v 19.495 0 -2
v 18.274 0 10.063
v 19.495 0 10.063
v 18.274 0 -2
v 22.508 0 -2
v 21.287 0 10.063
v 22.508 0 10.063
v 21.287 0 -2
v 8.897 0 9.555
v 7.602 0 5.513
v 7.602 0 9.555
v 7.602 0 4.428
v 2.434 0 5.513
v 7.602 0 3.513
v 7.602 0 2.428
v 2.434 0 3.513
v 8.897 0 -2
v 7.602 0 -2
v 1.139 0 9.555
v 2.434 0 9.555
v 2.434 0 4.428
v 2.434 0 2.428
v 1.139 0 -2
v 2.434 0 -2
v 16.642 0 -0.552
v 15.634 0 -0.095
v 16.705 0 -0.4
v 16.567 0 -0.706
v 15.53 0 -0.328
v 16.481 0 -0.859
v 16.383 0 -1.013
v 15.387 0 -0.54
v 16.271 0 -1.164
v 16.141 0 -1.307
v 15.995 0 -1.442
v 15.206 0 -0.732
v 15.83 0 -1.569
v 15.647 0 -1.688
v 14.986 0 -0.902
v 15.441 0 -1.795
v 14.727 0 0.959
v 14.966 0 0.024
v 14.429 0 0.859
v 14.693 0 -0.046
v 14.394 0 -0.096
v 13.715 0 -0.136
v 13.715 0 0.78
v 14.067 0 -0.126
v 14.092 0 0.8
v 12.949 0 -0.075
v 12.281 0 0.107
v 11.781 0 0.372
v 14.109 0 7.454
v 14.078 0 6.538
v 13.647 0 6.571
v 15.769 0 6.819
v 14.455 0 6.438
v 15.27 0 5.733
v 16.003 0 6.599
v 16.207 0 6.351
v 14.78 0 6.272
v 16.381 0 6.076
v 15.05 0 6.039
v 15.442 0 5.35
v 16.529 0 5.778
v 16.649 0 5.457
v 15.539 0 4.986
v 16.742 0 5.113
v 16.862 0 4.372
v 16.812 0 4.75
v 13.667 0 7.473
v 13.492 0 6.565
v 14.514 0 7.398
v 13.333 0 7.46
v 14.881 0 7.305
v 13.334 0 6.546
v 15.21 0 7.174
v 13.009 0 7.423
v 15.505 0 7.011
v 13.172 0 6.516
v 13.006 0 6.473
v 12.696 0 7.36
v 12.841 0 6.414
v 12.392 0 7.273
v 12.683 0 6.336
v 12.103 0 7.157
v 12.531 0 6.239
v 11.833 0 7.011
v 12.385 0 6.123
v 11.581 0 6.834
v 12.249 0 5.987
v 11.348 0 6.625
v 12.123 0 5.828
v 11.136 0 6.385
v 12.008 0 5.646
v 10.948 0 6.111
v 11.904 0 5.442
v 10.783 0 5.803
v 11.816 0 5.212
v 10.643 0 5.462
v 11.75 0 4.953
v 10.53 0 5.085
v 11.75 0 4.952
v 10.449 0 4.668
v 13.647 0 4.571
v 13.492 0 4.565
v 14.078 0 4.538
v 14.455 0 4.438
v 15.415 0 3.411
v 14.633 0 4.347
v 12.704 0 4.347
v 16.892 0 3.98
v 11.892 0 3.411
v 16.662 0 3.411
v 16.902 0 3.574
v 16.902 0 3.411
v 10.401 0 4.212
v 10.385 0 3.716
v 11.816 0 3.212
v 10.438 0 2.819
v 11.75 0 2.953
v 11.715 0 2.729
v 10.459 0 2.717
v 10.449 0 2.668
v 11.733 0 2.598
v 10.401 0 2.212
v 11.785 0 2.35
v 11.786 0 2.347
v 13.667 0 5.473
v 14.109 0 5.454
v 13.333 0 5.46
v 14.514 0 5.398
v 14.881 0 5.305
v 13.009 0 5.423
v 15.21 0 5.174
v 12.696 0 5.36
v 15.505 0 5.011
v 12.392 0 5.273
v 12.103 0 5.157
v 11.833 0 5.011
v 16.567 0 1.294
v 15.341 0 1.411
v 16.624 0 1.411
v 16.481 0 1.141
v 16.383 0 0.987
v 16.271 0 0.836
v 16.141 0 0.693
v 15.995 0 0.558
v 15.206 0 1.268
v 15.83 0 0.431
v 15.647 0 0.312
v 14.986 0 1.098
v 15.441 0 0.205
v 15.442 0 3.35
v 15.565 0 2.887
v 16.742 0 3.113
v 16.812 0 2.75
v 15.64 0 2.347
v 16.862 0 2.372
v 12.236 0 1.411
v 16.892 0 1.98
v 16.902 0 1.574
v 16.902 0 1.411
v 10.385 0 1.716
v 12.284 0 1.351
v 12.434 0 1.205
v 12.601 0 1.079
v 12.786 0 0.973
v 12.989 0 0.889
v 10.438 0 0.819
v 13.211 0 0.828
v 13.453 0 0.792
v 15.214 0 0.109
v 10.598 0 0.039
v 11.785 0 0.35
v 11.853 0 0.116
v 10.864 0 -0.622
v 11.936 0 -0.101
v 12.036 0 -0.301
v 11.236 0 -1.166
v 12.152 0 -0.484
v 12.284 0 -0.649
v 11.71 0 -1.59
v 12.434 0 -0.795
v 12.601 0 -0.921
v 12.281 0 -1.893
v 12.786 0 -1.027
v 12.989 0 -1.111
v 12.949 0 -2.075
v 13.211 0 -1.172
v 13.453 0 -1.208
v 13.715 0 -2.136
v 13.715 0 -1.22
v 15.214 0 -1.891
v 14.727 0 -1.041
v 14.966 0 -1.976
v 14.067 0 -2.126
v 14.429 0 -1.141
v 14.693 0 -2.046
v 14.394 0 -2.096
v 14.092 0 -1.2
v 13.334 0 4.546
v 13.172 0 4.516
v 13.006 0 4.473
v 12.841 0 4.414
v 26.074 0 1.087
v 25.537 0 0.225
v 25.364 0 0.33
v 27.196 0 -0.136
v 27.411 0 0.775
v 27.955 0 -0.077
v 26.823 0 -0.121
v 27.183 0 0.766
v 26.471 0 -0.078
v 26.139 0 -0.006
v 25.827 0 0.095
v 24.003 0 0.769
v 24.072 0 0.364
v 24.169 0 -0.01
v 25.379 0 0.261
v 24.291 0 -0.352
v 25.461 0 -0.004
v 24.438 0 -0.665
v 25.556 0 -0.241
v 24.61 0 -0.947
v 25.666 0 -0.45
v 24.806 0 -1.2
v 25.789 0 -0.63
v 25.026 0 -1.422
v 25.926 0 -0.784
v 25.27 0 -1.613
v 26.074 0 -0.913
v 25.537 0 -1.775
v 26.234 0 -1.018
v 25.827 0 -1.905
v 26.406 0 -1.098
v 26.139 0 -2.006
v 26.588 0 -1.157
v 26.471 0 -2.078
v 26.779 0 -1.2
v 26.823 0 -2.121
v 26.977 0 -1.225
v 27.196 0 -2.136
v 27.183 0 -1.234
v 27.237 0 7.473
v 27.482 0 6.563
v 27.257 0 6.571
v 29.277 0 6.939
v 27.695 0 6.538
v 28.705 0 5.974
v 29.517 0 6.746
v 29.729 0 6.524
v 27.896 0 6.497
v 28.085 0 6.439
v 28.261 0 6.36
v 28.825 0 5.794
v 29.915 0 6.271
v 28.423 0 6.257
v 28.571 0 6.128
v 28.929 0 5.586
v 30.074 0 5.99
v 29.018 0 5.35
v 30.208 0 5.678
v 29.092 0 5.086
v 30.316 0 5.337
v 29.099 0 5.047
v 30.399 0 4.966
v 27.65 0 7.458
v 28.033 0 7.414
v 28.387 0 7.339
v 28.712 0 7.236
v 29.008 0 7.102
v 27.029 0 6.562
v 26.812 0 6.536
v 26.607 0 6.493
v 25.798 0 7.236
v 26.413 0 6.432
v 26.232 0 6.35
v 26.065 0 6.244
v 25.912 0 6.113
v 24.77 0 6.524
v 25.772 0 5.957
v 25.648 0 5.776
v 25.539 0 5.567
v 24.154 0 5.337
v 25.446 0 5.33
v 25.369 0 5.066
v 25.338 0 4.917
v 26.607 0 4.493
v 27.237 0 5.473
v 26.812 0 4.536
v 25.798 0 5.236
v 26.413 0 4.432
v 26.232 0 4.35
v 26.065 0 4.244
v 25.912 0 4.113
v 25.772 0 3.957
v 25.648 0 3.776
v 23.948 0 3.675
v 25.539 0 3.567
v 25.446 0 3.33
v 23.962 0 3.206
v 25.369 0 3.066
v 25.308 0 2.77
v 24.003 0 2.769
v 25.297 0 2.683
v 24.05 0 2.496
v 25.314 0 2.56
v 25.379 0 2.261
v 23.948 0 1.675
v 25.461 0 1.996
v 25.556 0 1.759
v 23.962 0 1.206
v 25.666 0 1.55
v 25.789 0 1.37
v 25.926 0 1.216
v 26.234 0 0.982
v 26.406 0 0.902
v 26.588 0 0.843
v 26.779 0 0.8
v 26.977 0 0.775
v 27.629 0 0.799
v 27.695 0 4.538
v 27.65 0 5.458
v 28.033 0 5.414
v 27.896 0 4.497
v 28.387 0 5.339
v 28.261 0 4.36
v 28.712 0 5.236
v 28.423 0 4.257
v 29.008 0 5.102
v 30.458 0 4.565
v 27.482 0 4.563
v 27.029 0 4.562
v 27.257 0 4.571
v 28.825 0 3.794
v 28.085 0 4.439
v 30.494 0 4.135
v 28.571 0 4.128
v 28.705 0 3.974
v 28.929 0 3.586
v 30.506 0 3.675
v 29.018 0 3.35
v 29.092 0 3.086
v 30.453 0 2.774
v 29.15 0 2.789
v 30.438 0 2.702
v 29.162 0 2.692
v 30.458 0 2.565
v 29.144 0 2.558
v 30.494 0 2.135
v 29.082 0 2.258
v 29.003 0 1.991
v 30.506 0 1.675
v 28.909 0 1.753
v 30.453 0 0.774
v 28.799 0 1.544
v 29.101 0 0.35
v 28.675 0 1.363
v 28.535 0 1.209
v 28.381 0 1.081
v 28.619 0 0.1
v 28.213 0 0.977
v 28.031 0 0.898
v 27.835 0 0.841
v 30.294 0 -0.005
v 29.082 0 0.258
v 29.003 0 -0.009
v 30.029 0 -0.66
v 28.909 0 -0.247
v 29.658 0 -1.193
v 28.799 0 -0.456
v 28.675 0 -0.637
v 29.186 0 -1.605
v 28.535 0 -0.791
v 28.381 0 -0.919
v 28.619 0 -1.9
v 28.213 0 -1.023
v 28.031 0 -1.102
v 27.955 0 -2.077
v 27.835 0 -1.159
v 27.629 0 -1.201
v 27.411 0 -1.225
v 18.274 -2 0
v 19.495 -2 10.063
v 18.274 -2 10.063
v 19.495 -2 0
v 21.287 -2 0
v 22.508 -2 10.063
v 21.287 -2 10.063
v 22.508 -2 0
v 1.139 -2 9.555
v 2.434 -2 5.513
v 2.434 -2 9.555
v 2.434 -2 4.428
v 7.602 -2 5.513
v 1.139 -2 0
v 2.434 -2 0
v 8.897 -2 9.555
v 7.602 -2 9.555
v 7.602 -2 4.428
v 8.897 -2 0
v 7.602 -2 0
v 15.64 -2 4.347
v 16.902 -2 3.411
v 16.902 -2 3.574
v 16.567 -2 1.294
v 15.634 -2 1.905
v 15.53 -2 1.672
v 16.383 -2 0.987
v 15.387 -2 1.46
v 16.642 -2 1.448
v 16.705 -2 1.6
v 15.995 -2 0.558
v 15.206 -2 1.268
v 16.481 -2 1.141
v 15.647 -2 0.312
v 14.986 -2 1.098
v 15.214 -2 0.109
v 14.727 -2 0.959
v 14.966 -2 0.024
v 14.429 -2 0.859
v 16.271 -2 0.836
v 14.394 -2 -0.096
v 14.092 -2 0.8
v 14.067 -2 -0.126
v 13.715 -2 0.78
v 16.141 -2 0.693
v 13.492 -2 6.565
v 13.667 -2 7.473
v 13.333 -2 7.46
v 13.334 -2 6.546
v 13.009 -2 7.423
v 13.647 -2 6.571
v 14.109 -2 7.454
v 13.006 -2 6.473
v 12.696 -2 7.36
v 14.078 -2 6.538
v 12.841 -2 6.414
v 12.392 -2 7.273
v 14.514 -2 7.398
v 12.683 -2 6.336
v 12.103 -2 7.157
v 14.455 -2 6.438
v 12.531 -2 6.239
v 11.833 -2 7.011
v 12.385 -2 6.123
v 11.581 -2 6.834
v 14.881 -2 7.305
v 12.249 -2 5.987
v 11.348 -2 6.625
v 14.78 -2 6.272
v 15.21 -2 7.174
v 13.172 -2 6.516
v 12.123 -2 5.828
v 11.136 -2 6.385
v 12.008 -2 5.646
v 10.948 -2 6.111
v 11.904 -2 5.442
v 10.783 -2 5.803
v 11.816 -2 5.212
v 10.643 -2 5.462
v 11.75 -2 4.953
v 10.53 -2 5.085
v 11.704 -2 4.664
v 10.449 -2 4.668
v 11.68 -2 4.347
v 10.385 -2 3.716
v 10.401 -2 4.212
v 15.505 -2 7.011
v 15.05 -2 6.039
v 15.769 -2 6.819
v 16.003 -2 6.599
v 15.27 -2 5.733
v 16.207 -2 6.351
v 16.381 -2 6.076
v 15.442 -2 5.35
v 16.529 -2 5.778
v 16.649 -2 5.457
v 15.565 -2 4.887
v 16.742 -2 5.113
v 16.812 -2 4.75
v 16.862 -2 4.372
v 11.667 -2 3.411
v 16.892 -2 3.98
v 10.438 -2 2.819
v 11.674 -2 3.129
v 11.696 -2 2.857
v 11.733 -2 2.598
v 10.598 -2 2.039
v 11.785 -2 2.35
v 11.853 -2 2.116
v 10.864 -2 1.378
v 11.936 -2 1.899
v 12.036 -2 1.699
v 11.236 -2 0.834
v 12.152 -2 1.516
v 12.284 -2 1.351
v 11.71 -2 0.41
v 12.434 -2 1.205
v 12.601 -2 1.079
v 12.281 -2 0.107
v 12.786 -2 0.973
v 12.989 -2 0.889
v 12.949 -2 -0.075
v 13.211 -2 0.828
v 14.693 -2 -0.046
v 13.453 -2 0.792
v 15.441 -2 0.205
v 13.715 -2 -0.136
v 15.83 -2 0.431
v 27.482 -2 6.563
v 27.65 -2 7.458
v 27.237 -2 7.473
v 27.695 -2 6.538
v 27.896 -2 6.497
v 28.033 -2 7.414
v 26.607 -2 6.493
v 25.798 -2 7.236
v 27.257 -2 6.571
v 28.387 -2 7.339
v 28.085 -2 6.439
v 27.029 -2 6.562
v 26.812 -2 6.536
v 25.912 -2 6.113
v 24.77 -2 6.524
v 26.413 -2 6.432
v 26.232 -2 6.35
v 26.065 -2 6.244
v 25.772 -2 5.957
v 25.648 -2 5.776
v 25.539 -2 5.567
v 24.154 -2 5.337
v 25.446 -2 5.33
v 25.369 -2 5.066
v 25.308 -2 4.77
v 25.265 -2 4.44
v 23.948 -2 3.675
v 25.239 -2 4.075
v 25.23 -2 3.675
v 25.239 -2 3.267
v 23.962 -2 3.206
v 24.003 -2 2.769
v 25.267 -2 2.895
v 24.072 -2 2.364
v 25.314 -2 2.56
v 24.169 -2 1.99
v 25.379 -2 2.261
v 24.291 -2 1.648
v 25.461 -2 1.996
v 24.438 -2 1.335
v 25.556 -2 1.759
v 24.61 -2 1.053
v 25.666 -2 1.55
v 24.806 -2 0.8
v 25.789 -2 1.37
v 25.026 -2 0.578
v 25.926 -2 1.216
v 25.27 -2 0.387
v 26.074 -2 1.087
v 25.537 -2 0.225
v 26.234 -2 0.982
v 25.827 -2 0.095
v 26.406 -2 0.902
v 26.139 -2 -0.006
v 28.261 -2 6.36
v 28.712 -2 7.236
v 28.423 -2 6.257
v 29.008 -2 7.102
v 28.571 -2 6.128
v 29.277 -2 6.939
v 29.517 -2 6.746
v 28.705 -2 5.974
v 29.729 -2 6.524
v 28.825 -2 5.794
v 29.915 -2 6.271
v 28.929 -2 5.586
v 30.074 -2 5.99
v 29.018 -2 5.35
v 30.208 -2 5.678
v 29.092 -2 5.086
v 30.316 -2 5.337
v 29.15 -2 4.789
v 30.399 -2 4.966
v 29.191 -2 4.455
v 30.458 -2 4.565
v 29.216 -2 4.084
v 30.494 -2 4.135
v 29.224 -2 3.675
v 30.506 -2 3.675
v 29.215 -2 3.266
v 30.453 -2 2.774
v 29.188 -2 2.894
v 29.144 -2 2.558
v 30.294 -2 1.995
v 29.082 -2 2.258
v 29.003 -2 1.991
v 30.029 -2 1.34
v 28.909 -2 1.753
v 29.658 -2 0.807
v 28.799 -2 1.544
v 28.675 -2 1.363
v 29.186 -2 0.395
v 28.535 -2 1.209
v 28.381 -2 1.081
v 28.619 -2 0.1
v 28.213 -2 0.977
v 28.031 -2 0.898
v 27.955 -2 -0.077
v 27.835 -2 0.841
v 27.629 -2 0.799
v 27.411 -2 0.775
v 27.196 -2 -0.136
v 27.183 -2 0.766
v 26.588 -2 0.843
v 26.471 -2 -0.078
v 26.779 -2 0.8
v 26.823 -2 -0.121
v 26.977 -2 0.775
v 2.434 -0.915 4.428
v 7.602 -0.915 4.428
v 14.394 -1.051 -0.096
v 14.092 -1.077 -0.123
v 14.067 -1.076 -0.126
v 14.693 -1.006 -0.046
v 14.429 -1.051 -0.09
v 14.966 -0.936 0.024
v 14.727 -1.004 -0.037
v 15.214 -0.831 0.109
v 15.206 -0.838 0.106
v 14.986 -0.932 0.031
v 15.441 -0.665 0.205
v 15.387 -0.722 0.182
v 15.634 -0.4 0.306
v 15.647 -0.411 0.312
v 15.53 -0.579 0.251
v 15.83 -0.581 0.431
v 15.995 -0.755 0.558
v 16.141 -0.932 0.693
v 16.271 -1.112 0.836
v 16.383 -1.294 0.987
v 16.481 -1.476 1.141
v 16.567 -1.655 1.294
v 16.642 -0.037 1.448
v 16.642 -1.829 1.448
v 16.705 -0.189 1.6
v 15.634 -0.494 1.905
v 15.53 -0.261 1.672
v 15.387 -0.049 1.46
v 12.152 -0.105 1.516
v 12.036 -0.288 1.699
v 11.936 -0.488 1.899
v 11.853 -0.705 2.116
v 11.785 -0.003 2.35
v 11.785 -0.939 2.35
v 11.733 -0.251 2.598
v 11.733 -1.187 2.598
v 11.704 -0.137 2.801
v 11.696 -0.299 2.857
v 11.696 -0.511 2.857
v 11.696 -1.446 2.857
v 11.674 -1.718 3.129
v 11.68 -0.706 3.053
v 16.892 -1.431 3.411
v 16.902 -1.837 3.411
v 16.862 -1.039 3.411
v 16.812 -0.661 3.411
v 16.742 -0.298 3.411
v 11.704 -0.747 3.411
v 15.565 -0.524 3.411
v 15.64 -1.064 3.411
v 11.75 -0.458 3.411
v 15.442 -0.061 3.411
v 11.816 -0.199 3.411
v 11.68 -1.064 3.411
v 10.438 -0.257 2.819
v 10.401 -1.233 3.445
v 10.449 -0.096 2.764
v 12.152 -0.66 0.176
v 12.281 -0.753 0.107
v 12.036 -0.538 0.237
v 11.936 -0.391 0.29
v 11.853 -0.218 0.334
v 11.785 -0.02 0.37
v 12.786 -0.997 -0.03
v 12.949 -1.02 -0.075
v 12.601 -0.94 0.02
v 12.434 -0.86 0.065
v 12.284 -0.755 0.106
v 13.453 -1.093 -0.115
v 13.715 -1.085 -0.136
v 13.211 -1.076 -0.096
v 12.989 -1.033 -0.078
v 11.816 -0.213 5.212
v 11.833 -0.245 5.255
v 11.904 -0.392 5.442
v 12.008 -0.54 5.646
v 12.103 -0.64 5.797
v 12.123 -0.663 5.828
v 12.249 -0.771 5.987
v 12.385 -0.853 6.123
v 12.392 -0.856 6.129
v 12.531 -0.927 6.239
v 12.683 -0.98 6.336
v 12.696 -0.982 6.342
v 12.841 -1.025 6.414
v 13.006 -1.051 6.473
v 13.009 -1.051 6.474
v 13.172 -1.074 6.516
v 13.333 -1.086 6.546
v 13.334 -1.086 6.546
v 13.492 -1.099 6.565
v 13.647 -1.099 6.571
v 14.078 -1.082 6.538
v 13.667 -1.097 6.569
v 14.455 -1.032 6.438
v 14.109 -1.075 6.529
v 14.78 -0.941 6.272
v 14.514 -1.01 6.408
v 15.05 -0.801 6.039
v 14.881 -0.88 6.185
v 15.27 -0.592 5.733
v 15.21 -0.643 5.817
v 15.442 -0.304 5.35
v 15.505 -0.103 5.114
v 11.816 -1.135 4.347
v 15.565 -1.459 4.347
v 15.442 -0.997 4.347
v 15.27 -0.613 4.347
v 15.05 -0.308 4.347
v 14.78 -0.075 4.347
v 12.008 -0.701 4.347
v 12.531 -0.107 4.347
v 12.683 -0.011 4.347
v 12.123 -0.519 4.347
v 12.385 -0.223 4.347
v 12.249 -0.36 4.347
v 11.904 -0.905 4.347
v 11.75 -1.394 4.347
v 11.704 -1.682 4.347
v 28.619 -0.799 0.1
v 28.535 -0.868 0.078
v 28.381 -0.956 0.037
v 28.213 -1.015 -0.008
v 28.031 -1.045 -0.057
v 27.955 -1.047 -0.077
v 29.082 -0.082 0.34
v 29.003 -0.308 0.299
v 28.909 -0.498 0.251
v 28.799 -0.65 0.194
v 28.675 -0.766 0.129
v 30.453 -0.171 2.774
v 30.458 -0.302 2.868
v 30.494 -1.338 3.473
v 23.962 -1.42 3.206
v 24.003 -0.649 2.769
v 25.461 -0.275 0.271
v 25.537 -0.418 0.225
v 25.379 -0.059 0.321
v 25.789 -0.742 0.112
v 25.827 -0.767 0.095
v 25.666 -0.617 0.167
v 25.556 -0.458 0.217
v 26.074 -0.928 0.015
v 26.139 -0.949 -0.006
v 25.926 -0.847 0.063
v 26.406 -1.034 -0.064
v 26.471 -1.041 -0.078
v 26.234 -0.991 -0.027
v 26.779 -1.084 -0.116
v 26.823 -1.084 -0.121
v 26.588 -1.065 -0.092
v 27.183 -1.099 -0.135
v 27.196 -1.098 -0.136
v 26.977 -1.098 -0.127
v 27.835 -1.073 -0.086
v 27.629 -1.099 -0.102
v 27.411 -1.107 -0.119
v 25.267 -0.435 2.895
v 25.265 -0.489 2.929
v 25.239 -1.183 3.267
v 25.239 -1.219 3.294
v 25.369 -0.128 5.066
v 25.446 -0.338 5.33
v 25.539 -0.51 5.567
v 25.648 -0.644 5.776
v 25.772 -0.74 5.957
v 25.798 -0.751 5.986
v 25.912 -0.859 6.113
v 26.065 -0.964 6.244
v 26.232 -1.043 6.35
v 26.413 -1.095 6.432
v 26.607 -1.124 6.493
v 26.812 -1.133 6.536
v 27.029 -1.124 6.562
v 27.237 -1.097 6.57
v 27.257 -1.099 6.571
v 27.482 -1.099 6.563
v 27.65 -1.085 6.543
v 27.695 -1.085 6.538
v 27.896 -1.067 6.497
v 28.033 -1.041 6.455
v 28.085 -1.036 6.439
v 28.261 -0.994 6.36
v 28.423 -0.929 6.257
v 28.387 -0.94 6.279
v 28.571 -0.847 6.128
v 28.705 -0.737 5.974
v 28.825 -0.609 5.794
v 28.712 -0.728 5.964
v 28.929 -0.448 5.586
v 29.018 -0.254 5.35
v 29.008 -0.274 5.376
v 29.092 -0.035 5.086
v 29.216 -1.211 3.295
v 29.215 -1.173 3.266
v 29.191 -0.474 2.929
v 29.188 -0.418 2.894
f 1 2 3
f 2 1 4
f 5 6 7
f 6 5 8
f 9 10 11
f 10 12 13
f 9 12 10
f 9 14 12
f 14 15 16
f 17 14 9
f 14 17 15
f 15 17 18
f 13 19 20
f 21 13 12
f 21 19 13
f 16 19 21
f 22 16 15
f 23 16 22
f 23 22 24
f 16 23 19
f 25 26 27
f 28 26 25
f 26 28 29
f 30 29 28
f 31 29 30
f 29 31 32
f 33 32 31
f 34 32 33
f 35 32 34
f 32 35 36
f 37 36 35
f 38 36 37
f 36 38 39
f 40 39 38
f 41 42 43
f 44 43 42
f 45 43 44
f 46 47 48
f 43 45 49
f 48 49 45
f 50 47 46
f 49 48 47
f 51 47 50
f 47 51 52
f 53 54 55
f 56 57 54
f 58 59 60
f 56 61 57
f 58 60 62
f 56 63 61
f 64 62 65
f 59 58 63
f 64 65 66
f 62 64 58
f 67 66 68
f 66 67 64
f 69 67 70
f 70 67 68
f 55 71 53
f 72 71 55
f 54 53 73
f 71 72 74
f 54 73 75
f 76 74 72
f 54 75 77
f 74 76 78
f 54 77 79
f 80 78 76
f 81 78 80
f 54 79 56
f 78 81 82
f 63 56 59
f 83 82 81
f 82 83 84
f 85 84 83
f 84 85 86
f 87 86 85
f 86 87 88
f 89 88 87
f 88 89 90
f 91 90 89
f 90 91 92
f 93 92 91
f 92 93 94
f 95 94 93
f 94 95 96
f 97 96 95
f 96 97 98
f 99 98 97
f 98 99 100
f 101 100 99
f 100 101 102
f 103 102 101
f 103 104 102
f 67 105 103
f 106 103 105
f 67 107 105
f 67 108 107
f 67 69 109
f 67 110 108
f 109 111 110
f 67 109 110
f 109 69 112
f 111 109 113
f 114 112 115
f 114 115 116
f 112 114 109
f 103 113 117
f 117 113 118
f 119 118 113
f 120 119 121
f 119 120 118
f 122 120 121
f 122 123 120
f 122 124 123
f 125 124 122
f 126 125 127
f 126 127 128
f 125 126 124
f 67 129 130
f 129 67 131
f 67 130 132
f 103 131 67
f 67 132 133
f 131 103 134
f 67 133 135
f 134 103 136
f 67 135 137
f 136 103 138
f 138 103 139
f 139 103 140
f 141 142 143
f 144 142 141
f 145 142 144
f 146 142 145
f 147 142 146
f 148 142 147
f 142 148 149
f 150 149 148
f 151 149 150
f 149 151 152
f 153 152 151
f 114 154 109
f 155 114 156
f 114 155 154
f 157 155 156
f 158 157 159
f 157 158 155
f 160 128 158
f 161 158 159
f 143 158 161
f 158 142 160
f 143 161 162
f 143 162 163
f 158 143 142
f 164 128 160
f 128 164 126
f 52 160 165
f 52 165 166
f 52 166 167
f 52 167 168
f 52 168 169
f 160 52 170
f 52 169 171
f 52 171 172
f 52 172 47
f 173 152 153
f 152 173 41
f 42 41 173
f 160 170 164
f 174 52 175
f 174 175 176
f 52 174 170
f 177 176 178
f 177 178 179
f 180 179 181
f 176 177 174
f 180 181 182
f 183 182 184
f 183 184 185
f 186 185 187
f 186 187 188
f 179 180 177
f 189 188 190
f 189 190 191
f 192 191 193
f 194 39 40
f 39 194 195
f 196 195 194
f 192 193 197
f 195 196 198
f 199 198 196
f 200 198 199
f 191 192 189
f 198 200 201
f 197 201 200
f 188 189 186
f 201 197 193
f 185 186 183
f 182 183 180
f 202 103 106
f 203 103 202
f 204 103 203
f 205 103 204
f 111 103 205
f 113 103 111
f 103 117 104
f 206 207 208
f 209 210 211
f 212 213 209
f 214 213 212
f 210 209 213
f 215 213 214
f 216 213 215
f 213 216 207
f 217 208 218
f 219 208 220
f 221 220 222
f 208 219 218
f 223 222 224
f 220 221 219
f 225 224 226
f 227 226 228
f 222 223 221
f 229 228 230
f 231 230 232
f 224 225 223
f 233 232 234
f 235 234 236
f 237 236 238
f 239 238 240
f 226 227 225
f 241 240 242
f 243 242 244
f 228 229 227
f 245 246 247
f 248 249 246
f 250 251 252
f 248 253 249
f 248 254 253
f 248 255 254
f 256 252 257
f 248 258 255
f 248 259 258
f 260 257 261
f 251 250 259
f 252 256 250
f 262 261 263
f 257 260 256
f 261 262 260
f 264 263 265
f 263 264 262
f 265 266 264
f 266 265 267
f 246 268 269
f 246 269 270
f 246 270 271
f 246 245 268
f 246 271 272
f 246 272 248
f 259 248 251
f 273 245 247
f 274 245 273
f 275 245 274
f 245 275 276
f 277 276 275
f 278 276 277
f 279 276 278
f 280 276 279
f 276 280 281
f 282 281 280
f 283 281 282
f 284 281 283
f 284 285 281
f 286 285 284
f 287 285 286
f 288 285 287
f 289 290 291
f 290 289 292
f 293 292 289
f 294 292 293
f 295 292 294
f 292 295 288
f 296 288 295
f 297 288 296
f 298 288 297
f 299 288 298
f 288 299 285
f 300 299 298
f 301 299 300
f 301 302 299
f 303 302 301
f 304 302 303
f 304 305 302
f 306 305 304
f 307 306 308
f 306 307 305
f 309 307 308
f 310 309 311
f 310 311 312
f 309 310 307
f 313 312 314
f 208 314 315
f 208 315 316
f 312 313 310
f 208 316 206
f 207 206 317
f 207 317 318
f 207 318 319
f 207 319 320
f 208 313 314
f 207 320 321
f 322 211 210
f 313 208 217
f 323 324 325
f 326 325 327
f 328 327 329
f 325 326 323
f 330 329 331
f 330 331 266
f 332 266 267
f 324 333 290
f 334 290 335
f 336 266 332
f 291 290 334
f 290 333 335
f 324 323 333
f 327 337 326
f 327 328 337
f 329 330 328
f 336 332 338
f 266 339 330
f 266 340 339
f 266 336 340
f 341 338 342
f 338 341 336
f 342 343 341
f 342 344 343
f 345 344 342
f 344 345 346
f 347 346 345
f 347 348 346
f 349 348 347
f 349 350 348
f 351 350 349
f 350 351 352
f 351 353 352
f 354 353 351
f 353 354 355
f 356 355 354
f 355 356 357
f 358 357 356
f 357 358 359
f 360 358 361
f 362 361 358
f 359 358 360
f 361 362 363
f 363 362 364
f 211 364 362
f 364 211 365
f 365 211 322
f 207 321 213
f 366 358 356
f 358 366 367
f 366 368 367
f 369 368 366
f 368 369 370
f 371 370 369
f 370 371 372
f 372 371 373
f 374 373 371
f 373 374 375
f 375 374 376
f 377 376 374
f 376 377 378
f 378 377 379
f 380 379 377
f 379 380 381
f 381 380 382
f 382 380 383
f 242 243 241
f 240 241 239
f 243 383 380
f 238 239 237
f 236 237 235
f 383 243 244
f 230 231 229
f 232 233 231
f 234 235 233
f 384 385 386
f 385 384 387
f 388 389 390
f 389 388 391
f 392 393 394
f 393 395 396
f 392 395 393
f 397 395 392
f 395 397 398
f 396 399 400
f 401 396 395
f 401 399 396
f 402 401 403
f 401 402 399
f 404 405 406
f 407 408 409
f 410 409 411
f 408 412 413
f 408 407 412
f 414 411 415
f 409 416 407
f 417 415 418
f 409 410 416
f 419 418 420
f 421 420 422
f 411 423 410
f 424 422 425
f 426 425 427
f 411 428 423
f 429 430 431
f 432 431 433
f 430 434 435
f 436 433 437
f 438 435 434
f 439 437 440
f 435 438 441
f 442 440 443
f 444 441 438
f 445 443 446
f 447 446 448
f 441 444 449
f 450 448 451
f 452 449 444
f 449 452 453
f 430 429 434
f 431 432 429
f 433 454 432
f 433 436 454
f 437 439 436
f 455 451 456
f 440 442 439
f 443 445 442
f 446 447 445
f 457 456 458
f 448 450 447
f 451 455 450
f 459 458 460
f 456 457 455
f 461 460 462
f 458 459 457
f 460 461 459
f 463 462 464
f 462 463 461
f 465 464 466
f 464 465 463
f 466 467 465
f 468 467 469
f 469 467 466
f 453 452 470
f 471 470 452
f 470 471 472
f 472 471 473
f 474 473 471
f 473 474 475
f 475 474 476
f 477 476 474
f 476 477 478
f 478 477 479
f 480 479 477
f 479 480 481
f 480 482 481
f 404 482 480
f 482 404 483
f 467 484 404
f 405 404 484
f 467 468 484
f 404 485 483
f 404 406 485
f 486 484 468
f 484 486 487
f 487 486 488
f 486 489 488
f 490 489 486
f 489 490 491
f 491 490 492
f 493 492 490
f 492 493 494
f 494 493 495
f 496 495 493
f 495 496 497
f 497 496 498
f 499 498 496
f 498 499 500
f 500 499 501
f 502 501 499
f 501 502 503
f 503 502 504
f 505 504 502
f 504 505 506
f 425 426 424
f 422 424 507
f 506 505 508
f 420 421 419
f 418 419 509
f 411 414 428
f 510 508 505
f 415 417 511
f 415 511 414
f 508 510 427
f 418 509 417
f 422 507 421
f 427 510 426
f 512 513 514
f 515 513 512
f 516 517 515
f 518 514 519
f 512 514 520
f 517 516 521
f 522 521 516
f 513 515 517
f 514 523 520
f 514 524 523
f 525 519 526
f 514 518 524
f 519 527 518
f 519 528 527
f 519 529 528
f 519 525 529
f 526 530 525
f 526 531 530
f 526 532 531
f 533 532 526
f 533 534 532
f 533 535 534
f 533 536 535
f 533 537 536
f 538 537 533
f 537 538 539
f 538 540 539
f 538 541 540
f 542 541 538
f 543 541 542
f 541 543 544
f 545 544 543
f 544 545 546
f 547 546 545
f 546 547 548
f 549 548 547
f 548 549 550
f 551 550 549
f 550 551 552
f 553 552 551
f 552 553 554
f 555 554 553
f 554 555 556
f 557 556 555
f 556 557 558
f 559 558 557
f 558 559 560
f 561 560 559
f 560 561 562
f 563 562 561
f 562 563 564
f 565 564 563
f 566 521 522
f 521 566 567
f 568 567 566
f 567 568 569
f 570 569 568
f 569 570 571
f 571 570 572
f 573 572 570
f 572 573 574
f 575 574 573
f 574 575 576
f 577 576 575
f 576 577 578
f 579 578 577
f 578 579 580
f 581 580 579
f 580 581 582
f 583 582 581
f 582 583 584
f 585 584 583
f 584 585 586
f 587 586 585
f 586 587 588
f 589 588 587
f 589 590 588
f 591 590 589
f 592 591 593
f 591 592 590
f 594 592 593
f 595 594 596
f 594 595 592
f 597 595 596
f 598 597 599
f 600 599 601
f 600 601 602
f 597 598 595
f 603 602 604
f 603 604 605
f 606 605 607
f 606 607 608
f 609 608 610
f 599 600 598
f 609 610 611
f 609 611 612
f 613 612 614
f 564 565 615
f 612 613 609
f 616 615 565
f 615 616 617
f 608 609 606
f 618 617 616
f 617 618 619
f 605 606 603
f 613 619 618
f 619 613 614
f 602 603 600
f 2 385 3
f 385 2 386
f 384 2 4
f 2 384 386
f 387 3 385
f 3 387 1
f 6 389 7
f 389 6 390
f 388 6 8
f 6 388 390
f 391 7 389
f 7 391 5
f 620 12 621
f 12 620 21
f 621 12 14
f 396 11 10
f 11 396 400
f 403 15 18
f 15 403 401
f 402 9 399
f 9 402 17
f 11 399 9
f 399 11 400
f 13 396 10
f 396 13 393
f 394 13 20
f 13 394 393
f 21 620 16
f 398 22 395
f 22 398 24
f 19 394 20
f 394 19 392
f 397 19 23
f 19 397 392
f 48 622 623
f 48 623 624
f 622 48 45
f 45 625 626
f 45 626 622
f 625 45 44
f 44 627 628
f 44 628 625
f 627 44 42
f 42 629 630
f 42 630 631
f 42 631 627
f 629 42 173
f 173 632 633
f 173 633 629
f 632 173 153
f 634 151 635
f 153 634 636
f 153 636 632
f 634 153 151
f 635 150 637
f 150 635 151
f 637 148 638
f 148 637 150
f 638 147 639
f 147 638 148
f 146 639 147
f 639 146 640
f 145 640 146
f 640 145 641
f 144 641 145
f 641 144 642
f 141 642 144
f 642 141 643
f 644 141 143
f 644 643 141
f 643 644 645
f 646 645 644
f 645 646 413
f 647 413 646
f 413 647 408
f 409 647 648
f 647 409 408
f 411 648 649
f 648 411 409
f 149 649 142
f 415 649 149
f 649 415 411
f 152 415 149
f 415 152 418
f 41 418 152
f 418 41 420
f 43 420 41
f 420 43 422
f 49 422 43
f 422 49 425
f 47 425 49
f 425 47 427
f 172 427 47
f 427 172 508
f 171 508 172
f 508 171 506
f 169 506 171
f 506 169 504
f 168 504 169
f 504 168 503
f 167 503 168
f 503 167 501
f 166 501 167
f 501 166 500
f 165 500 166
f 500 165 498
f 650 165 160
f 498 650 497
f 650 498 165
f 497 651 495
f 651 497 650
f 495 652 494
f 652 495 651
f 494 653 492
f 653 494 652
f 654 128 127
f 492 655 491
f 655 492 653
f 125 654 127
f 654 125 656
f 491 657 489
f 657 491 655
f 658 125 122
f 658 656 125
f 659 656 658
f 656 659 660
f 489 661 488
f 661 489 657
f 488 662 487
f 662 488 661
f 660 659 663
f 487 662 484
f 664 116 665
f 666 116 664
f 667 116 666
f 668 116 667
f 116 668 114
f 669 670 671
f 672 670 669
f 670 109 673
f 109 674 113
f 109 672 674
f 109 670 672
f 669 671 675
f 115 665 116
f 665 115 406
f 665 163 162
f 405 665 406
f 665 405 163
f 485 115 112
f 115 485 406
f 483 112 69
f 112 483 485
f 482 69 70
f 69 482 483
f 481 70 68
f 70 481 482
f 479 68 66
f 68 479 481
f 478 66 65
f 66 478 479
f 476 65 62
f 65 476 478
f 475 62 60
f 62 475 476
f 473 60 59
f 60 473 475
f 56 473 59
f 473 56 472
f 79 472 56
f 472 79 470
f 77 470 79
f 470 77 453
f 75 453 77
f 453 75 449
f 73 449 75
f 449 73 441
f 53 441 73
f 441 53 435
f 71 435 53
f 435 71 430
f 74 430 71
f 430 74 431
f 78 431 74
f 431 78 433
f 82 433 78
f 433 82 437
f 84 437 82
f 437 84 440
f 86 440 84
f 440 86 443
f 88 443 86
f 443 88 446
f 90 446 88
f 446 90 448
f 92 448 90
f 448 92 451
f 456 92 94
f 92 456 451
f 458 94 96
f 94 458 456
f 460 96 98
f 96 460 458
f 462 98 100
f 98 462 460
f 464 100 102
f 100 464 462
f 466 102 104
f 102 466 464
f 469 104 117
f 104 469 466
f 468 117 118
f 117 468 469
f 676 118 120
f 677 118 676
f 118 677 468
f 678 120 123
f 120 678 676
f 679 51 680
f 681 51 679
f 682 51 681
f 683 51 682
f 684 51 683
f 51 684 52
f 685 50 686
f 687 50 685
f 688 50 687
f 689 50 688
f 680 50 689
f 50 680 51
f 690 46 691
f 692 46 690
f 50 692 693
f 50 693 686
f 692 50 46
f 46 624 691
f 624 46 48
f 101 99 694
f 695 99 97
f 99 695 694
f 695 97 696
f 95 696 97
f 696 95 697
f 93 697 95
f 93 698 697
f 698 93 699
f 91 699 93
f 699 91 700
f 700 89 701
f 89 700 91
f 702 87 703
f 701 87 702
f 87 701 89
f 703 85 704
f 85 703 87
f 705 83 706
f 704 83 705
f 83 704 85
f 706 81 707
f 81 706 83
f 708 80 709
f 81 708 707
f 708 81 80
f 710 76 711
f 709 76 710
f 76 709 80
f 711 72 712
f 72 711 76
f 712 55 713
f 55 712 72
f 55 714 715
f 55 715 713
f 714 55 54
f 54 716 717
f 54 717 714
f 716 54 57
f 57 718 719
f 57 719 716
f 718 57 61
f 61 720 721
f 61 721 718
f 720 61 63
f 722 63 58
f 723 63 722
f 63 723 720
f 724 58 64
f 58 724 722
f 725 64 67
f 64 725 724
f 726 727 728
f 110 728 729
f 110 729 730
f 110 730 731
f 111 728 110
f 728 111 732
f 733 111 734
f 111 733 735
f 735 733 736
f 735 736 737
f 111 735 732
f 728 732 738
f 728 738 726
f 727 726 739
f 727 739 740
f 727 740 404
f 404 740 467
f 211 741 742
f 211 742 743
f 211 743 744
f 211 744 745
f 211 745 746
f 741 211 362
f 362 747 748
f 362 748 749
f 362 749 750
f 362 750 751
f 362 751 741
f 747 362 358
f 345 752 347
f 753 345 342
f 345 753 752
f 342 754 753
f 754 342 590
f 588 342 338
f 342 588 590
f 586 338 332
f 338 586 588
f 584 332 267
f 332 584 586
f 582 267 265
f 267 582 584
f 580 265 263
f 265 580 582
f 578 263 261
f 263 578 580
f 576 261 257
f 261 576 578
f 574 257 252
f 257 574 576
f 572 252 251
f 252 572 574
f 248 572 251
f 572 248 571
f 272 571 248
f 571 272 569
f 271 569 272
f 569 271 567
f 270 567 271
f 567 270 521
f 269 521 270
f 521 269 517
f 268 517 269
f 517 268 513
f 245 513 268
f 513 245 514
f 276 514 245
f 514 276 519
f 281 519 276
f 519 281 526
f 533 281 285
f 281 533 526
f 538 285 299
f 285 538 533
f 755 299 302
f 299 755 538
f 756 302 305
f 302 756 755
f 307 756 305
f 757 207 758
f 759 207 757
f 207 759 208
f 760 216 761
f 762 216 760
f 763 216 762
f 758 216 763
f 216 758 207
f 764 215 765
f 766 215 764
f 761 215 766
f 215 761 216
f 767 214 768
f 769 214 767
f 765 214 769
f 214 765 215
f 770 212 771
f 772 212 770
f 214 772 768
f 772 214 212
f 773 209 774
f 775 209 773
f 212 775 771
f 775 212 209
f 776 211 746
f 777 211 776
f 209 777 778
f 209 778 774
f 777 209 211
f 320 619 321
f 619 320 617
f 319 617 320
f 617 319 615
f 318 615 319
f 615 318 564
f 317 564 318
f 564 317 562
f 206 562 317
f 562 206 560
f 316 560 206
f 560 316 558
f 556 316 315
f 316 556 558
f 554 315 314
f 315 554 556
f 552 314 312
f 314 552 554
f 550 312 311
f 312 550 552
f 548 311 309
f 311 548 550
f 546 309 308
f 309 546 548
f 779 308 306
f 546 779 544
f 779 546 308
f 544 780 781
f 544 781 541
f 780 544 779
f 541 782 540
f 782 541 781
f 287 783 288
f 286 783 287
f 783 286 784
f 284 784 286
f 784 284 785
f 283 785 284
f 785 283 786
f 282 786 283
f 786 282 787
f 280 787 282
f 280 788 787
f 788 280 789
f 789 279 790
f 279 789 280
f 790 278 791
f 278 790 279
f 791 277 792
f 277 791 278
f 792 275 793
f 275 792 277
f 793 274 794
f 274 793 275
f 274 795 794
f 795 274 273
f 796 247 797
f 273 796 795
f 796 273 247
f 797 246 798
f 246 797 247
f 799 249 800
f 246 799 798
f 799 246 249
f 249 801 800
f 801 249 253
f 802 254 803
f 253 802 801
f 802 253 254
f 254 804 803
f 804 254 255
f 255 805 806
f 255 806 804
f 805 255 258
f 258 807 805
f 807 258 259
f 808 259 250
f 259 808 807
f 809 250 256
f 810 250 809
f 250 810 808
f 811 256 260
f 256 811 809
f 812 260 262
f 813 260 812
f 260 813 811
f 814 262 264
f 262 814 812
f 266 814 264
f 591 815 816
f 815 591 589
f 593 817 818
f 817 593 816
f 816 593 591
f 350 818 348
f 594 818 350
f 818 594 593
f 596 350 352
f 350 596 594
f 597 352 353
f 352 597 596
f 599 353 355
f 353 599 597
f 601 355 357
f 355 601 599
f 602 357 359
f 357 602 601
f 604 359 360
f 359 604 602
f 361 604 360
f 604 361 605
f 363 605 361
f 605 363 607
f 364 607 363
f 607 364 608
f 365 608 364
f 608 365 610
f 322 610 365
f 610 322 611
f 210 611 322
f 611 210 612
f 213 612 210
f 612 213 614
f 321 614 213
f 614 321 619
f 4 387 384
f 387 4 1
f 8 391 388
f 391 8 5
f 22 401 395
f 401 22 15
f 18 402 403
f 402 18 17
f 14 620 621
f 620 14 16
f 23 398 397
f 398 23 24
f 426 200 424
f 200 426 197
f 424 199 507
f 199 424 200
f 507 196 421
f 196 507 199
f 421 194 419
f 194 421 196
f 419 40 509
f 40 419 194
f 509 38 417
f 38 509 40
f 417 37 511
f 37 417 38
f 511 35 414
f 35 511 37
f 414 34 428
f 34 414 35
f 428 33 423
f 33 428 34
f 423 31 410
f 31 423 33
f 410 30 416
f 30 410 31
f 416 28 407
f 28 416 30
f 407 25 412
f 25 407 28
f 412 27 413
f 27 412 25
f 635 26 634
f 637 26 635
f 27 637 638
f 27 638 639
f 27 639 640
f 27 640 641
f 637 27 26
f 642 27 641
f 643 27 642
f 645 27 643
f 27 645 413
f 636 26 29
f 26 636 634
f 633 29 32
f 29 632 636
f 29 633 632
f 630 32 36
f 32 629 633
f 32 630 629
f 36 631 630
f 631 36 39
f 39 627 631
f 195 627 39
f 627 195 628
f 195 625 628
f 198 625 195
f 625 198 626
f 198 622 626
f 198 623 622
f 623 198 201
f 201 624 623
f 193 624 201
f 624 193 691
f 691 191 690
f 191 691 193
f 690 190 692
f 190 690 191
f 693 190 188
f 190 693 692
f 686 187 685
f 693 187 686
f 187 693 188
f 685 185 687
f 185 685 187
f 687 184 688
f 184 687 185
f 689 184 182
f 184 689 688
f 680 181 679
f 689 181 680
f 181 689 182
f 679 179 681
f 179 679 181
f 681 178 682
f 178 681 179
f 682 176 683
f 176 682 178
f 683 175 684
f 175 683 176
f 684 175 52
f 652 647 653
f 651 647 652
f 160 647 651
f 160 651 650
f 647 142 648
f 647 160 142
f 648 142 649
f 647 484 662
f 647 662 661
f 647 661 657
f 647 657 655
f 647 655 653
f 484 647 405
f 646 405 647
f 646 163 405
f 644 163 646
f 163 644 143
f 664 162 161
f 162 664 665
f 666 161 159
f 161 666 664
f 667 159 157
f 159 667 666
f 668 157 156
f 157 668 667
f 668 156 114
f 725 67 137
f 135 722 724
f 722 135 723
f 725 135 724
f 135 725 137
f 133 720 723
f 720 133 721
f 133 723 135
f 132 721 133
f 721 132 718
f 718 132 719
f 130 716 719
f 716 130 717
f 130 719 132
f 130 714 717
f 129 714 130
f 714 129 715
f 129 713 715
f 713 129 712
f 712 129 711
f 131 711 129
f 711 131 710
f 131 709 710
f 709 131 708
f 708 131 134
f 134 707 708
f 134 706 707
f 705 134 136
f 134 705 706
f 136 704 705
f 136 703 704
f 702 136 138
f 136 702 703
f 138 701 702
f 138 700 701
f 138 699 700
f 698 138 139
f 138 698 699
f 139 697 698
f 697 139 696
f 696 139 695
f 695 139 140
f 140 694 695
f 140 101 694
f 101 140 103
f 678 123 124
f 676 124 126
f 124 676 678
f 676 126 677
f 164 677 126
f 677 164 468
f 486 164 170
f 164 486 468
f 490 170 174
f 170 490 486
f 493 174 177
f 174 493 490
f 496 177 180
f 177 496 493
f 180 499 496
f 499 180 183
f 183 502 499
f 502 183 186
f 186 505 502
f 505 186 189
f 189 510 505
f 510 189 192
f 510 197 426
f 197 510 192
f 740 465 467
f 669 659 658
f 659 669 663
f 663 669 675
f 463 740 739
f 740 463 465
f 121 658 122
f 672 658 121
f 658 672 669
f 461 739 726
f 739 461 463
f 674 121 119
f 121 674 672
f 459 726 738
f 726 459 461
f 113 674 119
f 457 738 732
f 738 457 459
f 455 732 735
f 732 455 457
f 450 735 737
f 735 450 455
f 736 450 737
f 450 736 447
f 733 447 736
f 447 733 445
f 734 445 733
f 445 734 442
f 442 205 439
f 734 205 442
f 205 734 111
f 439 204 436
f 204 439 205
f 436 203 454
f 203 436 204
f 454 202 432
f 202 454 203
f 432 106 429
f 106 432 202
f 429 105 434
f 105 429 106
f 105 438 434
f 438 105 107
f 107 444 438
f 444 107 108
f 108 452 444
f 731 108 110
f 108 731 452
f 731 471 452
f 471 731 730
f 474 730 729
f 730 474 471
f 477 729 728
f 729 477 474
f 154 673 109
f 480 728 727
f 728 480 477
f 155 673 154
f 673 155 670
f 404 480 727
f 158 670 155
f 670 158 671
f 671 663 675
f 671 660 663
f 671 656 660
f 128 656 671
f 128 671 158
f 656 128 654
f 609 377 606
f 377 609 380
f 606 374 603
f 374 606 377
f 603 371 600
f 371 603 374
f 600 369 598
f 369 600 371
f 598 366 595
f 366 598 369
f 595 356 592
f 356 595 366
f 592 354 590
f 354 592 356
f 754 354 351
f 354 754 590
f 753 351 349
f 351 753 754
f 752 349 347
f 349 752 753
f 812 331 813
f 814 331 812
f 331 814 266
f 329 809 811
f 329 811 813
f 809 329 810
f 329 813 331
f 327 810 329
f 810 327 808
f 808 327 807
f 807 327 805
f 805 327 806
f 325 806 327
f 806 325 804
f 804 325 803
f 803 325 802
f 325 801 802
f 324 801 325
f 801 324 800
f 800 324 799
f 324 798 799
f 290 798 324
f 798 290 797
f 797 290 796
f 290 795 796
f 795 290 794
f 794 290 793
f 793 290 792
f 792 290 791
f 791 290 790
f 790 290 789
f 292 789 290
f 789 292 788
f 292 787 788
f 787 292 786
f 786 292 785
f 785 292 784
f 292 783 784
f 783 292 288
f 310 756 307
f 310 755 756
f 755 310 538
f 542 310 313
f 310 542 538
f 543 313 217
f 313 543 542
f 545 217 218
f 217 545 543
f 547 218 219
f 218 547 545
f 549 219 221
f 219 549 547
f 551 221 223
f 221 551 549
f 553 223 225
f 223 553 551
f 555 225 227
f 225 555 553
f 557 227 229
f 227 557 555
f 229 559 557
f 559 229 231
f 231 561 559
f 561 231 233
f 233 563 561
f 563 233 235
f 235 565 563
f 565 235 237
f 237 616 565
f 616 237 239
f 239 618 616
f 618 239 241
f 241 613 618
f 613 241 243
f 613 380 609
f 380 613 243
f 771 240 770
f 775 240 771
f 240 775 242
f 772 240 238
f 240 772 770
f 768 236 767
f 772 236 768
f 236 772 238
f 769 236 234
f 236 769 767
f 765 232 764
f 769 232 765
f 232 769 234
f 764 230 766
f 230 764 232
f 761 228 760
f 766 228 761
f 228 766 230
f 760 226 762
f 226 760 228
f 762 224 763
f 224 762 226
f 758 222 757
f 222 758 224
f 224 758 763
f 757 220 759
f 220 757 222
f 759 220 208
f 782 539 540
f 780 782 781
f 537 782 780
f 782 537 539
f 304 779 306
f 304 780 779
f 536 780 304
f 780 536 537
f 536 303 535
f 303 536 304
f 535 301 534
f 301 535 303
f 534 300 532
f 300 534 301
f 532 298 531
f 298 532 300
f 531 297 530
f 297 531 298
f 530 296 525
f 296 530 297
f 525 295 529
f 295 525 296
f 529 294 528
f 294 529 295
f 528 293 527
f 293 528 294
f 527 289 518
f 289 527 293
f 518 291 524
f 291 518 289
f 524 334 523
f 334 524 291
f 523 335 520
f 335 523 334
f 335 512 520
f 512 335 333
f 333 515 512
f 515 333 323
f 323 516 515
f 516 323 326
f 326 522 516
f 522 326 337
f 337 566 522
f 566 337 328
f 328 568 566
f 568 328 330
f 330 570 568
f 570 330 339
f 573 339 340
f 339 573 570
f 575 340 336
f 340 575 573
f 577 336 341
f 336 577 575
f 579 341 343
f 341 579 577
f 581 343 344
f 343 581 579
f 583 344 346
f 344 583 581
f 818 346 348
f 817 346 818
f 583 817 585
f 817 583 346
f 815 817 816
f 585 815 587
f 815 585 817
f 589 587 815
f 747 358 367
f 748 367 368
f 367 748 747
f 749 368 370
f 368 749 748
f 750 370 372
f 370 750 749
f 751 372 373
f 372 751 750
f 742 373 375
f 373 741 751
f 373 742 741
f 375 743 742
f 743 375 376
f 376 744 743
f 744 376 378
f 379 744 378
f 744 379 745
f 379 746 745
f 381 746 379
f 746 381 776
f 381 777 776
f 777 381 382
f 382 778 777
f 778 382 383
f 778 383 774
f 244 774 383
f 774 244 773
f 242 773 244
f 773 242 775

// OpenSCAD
module vertical_extrude(height=2,slope=1) {
    rotate([90,0,0]) {
        linear_extrude(height=height) children();
        m = [[1,0,0,0],
                    [0,1,slope,-slope*height],
                    [0,0,1,0],
                    [0,0,0,1]];
        echo(m);
        multmatrix(m) linear_extrude(height=height) children();
    }
}

vertical_extrude() text("Hello");
